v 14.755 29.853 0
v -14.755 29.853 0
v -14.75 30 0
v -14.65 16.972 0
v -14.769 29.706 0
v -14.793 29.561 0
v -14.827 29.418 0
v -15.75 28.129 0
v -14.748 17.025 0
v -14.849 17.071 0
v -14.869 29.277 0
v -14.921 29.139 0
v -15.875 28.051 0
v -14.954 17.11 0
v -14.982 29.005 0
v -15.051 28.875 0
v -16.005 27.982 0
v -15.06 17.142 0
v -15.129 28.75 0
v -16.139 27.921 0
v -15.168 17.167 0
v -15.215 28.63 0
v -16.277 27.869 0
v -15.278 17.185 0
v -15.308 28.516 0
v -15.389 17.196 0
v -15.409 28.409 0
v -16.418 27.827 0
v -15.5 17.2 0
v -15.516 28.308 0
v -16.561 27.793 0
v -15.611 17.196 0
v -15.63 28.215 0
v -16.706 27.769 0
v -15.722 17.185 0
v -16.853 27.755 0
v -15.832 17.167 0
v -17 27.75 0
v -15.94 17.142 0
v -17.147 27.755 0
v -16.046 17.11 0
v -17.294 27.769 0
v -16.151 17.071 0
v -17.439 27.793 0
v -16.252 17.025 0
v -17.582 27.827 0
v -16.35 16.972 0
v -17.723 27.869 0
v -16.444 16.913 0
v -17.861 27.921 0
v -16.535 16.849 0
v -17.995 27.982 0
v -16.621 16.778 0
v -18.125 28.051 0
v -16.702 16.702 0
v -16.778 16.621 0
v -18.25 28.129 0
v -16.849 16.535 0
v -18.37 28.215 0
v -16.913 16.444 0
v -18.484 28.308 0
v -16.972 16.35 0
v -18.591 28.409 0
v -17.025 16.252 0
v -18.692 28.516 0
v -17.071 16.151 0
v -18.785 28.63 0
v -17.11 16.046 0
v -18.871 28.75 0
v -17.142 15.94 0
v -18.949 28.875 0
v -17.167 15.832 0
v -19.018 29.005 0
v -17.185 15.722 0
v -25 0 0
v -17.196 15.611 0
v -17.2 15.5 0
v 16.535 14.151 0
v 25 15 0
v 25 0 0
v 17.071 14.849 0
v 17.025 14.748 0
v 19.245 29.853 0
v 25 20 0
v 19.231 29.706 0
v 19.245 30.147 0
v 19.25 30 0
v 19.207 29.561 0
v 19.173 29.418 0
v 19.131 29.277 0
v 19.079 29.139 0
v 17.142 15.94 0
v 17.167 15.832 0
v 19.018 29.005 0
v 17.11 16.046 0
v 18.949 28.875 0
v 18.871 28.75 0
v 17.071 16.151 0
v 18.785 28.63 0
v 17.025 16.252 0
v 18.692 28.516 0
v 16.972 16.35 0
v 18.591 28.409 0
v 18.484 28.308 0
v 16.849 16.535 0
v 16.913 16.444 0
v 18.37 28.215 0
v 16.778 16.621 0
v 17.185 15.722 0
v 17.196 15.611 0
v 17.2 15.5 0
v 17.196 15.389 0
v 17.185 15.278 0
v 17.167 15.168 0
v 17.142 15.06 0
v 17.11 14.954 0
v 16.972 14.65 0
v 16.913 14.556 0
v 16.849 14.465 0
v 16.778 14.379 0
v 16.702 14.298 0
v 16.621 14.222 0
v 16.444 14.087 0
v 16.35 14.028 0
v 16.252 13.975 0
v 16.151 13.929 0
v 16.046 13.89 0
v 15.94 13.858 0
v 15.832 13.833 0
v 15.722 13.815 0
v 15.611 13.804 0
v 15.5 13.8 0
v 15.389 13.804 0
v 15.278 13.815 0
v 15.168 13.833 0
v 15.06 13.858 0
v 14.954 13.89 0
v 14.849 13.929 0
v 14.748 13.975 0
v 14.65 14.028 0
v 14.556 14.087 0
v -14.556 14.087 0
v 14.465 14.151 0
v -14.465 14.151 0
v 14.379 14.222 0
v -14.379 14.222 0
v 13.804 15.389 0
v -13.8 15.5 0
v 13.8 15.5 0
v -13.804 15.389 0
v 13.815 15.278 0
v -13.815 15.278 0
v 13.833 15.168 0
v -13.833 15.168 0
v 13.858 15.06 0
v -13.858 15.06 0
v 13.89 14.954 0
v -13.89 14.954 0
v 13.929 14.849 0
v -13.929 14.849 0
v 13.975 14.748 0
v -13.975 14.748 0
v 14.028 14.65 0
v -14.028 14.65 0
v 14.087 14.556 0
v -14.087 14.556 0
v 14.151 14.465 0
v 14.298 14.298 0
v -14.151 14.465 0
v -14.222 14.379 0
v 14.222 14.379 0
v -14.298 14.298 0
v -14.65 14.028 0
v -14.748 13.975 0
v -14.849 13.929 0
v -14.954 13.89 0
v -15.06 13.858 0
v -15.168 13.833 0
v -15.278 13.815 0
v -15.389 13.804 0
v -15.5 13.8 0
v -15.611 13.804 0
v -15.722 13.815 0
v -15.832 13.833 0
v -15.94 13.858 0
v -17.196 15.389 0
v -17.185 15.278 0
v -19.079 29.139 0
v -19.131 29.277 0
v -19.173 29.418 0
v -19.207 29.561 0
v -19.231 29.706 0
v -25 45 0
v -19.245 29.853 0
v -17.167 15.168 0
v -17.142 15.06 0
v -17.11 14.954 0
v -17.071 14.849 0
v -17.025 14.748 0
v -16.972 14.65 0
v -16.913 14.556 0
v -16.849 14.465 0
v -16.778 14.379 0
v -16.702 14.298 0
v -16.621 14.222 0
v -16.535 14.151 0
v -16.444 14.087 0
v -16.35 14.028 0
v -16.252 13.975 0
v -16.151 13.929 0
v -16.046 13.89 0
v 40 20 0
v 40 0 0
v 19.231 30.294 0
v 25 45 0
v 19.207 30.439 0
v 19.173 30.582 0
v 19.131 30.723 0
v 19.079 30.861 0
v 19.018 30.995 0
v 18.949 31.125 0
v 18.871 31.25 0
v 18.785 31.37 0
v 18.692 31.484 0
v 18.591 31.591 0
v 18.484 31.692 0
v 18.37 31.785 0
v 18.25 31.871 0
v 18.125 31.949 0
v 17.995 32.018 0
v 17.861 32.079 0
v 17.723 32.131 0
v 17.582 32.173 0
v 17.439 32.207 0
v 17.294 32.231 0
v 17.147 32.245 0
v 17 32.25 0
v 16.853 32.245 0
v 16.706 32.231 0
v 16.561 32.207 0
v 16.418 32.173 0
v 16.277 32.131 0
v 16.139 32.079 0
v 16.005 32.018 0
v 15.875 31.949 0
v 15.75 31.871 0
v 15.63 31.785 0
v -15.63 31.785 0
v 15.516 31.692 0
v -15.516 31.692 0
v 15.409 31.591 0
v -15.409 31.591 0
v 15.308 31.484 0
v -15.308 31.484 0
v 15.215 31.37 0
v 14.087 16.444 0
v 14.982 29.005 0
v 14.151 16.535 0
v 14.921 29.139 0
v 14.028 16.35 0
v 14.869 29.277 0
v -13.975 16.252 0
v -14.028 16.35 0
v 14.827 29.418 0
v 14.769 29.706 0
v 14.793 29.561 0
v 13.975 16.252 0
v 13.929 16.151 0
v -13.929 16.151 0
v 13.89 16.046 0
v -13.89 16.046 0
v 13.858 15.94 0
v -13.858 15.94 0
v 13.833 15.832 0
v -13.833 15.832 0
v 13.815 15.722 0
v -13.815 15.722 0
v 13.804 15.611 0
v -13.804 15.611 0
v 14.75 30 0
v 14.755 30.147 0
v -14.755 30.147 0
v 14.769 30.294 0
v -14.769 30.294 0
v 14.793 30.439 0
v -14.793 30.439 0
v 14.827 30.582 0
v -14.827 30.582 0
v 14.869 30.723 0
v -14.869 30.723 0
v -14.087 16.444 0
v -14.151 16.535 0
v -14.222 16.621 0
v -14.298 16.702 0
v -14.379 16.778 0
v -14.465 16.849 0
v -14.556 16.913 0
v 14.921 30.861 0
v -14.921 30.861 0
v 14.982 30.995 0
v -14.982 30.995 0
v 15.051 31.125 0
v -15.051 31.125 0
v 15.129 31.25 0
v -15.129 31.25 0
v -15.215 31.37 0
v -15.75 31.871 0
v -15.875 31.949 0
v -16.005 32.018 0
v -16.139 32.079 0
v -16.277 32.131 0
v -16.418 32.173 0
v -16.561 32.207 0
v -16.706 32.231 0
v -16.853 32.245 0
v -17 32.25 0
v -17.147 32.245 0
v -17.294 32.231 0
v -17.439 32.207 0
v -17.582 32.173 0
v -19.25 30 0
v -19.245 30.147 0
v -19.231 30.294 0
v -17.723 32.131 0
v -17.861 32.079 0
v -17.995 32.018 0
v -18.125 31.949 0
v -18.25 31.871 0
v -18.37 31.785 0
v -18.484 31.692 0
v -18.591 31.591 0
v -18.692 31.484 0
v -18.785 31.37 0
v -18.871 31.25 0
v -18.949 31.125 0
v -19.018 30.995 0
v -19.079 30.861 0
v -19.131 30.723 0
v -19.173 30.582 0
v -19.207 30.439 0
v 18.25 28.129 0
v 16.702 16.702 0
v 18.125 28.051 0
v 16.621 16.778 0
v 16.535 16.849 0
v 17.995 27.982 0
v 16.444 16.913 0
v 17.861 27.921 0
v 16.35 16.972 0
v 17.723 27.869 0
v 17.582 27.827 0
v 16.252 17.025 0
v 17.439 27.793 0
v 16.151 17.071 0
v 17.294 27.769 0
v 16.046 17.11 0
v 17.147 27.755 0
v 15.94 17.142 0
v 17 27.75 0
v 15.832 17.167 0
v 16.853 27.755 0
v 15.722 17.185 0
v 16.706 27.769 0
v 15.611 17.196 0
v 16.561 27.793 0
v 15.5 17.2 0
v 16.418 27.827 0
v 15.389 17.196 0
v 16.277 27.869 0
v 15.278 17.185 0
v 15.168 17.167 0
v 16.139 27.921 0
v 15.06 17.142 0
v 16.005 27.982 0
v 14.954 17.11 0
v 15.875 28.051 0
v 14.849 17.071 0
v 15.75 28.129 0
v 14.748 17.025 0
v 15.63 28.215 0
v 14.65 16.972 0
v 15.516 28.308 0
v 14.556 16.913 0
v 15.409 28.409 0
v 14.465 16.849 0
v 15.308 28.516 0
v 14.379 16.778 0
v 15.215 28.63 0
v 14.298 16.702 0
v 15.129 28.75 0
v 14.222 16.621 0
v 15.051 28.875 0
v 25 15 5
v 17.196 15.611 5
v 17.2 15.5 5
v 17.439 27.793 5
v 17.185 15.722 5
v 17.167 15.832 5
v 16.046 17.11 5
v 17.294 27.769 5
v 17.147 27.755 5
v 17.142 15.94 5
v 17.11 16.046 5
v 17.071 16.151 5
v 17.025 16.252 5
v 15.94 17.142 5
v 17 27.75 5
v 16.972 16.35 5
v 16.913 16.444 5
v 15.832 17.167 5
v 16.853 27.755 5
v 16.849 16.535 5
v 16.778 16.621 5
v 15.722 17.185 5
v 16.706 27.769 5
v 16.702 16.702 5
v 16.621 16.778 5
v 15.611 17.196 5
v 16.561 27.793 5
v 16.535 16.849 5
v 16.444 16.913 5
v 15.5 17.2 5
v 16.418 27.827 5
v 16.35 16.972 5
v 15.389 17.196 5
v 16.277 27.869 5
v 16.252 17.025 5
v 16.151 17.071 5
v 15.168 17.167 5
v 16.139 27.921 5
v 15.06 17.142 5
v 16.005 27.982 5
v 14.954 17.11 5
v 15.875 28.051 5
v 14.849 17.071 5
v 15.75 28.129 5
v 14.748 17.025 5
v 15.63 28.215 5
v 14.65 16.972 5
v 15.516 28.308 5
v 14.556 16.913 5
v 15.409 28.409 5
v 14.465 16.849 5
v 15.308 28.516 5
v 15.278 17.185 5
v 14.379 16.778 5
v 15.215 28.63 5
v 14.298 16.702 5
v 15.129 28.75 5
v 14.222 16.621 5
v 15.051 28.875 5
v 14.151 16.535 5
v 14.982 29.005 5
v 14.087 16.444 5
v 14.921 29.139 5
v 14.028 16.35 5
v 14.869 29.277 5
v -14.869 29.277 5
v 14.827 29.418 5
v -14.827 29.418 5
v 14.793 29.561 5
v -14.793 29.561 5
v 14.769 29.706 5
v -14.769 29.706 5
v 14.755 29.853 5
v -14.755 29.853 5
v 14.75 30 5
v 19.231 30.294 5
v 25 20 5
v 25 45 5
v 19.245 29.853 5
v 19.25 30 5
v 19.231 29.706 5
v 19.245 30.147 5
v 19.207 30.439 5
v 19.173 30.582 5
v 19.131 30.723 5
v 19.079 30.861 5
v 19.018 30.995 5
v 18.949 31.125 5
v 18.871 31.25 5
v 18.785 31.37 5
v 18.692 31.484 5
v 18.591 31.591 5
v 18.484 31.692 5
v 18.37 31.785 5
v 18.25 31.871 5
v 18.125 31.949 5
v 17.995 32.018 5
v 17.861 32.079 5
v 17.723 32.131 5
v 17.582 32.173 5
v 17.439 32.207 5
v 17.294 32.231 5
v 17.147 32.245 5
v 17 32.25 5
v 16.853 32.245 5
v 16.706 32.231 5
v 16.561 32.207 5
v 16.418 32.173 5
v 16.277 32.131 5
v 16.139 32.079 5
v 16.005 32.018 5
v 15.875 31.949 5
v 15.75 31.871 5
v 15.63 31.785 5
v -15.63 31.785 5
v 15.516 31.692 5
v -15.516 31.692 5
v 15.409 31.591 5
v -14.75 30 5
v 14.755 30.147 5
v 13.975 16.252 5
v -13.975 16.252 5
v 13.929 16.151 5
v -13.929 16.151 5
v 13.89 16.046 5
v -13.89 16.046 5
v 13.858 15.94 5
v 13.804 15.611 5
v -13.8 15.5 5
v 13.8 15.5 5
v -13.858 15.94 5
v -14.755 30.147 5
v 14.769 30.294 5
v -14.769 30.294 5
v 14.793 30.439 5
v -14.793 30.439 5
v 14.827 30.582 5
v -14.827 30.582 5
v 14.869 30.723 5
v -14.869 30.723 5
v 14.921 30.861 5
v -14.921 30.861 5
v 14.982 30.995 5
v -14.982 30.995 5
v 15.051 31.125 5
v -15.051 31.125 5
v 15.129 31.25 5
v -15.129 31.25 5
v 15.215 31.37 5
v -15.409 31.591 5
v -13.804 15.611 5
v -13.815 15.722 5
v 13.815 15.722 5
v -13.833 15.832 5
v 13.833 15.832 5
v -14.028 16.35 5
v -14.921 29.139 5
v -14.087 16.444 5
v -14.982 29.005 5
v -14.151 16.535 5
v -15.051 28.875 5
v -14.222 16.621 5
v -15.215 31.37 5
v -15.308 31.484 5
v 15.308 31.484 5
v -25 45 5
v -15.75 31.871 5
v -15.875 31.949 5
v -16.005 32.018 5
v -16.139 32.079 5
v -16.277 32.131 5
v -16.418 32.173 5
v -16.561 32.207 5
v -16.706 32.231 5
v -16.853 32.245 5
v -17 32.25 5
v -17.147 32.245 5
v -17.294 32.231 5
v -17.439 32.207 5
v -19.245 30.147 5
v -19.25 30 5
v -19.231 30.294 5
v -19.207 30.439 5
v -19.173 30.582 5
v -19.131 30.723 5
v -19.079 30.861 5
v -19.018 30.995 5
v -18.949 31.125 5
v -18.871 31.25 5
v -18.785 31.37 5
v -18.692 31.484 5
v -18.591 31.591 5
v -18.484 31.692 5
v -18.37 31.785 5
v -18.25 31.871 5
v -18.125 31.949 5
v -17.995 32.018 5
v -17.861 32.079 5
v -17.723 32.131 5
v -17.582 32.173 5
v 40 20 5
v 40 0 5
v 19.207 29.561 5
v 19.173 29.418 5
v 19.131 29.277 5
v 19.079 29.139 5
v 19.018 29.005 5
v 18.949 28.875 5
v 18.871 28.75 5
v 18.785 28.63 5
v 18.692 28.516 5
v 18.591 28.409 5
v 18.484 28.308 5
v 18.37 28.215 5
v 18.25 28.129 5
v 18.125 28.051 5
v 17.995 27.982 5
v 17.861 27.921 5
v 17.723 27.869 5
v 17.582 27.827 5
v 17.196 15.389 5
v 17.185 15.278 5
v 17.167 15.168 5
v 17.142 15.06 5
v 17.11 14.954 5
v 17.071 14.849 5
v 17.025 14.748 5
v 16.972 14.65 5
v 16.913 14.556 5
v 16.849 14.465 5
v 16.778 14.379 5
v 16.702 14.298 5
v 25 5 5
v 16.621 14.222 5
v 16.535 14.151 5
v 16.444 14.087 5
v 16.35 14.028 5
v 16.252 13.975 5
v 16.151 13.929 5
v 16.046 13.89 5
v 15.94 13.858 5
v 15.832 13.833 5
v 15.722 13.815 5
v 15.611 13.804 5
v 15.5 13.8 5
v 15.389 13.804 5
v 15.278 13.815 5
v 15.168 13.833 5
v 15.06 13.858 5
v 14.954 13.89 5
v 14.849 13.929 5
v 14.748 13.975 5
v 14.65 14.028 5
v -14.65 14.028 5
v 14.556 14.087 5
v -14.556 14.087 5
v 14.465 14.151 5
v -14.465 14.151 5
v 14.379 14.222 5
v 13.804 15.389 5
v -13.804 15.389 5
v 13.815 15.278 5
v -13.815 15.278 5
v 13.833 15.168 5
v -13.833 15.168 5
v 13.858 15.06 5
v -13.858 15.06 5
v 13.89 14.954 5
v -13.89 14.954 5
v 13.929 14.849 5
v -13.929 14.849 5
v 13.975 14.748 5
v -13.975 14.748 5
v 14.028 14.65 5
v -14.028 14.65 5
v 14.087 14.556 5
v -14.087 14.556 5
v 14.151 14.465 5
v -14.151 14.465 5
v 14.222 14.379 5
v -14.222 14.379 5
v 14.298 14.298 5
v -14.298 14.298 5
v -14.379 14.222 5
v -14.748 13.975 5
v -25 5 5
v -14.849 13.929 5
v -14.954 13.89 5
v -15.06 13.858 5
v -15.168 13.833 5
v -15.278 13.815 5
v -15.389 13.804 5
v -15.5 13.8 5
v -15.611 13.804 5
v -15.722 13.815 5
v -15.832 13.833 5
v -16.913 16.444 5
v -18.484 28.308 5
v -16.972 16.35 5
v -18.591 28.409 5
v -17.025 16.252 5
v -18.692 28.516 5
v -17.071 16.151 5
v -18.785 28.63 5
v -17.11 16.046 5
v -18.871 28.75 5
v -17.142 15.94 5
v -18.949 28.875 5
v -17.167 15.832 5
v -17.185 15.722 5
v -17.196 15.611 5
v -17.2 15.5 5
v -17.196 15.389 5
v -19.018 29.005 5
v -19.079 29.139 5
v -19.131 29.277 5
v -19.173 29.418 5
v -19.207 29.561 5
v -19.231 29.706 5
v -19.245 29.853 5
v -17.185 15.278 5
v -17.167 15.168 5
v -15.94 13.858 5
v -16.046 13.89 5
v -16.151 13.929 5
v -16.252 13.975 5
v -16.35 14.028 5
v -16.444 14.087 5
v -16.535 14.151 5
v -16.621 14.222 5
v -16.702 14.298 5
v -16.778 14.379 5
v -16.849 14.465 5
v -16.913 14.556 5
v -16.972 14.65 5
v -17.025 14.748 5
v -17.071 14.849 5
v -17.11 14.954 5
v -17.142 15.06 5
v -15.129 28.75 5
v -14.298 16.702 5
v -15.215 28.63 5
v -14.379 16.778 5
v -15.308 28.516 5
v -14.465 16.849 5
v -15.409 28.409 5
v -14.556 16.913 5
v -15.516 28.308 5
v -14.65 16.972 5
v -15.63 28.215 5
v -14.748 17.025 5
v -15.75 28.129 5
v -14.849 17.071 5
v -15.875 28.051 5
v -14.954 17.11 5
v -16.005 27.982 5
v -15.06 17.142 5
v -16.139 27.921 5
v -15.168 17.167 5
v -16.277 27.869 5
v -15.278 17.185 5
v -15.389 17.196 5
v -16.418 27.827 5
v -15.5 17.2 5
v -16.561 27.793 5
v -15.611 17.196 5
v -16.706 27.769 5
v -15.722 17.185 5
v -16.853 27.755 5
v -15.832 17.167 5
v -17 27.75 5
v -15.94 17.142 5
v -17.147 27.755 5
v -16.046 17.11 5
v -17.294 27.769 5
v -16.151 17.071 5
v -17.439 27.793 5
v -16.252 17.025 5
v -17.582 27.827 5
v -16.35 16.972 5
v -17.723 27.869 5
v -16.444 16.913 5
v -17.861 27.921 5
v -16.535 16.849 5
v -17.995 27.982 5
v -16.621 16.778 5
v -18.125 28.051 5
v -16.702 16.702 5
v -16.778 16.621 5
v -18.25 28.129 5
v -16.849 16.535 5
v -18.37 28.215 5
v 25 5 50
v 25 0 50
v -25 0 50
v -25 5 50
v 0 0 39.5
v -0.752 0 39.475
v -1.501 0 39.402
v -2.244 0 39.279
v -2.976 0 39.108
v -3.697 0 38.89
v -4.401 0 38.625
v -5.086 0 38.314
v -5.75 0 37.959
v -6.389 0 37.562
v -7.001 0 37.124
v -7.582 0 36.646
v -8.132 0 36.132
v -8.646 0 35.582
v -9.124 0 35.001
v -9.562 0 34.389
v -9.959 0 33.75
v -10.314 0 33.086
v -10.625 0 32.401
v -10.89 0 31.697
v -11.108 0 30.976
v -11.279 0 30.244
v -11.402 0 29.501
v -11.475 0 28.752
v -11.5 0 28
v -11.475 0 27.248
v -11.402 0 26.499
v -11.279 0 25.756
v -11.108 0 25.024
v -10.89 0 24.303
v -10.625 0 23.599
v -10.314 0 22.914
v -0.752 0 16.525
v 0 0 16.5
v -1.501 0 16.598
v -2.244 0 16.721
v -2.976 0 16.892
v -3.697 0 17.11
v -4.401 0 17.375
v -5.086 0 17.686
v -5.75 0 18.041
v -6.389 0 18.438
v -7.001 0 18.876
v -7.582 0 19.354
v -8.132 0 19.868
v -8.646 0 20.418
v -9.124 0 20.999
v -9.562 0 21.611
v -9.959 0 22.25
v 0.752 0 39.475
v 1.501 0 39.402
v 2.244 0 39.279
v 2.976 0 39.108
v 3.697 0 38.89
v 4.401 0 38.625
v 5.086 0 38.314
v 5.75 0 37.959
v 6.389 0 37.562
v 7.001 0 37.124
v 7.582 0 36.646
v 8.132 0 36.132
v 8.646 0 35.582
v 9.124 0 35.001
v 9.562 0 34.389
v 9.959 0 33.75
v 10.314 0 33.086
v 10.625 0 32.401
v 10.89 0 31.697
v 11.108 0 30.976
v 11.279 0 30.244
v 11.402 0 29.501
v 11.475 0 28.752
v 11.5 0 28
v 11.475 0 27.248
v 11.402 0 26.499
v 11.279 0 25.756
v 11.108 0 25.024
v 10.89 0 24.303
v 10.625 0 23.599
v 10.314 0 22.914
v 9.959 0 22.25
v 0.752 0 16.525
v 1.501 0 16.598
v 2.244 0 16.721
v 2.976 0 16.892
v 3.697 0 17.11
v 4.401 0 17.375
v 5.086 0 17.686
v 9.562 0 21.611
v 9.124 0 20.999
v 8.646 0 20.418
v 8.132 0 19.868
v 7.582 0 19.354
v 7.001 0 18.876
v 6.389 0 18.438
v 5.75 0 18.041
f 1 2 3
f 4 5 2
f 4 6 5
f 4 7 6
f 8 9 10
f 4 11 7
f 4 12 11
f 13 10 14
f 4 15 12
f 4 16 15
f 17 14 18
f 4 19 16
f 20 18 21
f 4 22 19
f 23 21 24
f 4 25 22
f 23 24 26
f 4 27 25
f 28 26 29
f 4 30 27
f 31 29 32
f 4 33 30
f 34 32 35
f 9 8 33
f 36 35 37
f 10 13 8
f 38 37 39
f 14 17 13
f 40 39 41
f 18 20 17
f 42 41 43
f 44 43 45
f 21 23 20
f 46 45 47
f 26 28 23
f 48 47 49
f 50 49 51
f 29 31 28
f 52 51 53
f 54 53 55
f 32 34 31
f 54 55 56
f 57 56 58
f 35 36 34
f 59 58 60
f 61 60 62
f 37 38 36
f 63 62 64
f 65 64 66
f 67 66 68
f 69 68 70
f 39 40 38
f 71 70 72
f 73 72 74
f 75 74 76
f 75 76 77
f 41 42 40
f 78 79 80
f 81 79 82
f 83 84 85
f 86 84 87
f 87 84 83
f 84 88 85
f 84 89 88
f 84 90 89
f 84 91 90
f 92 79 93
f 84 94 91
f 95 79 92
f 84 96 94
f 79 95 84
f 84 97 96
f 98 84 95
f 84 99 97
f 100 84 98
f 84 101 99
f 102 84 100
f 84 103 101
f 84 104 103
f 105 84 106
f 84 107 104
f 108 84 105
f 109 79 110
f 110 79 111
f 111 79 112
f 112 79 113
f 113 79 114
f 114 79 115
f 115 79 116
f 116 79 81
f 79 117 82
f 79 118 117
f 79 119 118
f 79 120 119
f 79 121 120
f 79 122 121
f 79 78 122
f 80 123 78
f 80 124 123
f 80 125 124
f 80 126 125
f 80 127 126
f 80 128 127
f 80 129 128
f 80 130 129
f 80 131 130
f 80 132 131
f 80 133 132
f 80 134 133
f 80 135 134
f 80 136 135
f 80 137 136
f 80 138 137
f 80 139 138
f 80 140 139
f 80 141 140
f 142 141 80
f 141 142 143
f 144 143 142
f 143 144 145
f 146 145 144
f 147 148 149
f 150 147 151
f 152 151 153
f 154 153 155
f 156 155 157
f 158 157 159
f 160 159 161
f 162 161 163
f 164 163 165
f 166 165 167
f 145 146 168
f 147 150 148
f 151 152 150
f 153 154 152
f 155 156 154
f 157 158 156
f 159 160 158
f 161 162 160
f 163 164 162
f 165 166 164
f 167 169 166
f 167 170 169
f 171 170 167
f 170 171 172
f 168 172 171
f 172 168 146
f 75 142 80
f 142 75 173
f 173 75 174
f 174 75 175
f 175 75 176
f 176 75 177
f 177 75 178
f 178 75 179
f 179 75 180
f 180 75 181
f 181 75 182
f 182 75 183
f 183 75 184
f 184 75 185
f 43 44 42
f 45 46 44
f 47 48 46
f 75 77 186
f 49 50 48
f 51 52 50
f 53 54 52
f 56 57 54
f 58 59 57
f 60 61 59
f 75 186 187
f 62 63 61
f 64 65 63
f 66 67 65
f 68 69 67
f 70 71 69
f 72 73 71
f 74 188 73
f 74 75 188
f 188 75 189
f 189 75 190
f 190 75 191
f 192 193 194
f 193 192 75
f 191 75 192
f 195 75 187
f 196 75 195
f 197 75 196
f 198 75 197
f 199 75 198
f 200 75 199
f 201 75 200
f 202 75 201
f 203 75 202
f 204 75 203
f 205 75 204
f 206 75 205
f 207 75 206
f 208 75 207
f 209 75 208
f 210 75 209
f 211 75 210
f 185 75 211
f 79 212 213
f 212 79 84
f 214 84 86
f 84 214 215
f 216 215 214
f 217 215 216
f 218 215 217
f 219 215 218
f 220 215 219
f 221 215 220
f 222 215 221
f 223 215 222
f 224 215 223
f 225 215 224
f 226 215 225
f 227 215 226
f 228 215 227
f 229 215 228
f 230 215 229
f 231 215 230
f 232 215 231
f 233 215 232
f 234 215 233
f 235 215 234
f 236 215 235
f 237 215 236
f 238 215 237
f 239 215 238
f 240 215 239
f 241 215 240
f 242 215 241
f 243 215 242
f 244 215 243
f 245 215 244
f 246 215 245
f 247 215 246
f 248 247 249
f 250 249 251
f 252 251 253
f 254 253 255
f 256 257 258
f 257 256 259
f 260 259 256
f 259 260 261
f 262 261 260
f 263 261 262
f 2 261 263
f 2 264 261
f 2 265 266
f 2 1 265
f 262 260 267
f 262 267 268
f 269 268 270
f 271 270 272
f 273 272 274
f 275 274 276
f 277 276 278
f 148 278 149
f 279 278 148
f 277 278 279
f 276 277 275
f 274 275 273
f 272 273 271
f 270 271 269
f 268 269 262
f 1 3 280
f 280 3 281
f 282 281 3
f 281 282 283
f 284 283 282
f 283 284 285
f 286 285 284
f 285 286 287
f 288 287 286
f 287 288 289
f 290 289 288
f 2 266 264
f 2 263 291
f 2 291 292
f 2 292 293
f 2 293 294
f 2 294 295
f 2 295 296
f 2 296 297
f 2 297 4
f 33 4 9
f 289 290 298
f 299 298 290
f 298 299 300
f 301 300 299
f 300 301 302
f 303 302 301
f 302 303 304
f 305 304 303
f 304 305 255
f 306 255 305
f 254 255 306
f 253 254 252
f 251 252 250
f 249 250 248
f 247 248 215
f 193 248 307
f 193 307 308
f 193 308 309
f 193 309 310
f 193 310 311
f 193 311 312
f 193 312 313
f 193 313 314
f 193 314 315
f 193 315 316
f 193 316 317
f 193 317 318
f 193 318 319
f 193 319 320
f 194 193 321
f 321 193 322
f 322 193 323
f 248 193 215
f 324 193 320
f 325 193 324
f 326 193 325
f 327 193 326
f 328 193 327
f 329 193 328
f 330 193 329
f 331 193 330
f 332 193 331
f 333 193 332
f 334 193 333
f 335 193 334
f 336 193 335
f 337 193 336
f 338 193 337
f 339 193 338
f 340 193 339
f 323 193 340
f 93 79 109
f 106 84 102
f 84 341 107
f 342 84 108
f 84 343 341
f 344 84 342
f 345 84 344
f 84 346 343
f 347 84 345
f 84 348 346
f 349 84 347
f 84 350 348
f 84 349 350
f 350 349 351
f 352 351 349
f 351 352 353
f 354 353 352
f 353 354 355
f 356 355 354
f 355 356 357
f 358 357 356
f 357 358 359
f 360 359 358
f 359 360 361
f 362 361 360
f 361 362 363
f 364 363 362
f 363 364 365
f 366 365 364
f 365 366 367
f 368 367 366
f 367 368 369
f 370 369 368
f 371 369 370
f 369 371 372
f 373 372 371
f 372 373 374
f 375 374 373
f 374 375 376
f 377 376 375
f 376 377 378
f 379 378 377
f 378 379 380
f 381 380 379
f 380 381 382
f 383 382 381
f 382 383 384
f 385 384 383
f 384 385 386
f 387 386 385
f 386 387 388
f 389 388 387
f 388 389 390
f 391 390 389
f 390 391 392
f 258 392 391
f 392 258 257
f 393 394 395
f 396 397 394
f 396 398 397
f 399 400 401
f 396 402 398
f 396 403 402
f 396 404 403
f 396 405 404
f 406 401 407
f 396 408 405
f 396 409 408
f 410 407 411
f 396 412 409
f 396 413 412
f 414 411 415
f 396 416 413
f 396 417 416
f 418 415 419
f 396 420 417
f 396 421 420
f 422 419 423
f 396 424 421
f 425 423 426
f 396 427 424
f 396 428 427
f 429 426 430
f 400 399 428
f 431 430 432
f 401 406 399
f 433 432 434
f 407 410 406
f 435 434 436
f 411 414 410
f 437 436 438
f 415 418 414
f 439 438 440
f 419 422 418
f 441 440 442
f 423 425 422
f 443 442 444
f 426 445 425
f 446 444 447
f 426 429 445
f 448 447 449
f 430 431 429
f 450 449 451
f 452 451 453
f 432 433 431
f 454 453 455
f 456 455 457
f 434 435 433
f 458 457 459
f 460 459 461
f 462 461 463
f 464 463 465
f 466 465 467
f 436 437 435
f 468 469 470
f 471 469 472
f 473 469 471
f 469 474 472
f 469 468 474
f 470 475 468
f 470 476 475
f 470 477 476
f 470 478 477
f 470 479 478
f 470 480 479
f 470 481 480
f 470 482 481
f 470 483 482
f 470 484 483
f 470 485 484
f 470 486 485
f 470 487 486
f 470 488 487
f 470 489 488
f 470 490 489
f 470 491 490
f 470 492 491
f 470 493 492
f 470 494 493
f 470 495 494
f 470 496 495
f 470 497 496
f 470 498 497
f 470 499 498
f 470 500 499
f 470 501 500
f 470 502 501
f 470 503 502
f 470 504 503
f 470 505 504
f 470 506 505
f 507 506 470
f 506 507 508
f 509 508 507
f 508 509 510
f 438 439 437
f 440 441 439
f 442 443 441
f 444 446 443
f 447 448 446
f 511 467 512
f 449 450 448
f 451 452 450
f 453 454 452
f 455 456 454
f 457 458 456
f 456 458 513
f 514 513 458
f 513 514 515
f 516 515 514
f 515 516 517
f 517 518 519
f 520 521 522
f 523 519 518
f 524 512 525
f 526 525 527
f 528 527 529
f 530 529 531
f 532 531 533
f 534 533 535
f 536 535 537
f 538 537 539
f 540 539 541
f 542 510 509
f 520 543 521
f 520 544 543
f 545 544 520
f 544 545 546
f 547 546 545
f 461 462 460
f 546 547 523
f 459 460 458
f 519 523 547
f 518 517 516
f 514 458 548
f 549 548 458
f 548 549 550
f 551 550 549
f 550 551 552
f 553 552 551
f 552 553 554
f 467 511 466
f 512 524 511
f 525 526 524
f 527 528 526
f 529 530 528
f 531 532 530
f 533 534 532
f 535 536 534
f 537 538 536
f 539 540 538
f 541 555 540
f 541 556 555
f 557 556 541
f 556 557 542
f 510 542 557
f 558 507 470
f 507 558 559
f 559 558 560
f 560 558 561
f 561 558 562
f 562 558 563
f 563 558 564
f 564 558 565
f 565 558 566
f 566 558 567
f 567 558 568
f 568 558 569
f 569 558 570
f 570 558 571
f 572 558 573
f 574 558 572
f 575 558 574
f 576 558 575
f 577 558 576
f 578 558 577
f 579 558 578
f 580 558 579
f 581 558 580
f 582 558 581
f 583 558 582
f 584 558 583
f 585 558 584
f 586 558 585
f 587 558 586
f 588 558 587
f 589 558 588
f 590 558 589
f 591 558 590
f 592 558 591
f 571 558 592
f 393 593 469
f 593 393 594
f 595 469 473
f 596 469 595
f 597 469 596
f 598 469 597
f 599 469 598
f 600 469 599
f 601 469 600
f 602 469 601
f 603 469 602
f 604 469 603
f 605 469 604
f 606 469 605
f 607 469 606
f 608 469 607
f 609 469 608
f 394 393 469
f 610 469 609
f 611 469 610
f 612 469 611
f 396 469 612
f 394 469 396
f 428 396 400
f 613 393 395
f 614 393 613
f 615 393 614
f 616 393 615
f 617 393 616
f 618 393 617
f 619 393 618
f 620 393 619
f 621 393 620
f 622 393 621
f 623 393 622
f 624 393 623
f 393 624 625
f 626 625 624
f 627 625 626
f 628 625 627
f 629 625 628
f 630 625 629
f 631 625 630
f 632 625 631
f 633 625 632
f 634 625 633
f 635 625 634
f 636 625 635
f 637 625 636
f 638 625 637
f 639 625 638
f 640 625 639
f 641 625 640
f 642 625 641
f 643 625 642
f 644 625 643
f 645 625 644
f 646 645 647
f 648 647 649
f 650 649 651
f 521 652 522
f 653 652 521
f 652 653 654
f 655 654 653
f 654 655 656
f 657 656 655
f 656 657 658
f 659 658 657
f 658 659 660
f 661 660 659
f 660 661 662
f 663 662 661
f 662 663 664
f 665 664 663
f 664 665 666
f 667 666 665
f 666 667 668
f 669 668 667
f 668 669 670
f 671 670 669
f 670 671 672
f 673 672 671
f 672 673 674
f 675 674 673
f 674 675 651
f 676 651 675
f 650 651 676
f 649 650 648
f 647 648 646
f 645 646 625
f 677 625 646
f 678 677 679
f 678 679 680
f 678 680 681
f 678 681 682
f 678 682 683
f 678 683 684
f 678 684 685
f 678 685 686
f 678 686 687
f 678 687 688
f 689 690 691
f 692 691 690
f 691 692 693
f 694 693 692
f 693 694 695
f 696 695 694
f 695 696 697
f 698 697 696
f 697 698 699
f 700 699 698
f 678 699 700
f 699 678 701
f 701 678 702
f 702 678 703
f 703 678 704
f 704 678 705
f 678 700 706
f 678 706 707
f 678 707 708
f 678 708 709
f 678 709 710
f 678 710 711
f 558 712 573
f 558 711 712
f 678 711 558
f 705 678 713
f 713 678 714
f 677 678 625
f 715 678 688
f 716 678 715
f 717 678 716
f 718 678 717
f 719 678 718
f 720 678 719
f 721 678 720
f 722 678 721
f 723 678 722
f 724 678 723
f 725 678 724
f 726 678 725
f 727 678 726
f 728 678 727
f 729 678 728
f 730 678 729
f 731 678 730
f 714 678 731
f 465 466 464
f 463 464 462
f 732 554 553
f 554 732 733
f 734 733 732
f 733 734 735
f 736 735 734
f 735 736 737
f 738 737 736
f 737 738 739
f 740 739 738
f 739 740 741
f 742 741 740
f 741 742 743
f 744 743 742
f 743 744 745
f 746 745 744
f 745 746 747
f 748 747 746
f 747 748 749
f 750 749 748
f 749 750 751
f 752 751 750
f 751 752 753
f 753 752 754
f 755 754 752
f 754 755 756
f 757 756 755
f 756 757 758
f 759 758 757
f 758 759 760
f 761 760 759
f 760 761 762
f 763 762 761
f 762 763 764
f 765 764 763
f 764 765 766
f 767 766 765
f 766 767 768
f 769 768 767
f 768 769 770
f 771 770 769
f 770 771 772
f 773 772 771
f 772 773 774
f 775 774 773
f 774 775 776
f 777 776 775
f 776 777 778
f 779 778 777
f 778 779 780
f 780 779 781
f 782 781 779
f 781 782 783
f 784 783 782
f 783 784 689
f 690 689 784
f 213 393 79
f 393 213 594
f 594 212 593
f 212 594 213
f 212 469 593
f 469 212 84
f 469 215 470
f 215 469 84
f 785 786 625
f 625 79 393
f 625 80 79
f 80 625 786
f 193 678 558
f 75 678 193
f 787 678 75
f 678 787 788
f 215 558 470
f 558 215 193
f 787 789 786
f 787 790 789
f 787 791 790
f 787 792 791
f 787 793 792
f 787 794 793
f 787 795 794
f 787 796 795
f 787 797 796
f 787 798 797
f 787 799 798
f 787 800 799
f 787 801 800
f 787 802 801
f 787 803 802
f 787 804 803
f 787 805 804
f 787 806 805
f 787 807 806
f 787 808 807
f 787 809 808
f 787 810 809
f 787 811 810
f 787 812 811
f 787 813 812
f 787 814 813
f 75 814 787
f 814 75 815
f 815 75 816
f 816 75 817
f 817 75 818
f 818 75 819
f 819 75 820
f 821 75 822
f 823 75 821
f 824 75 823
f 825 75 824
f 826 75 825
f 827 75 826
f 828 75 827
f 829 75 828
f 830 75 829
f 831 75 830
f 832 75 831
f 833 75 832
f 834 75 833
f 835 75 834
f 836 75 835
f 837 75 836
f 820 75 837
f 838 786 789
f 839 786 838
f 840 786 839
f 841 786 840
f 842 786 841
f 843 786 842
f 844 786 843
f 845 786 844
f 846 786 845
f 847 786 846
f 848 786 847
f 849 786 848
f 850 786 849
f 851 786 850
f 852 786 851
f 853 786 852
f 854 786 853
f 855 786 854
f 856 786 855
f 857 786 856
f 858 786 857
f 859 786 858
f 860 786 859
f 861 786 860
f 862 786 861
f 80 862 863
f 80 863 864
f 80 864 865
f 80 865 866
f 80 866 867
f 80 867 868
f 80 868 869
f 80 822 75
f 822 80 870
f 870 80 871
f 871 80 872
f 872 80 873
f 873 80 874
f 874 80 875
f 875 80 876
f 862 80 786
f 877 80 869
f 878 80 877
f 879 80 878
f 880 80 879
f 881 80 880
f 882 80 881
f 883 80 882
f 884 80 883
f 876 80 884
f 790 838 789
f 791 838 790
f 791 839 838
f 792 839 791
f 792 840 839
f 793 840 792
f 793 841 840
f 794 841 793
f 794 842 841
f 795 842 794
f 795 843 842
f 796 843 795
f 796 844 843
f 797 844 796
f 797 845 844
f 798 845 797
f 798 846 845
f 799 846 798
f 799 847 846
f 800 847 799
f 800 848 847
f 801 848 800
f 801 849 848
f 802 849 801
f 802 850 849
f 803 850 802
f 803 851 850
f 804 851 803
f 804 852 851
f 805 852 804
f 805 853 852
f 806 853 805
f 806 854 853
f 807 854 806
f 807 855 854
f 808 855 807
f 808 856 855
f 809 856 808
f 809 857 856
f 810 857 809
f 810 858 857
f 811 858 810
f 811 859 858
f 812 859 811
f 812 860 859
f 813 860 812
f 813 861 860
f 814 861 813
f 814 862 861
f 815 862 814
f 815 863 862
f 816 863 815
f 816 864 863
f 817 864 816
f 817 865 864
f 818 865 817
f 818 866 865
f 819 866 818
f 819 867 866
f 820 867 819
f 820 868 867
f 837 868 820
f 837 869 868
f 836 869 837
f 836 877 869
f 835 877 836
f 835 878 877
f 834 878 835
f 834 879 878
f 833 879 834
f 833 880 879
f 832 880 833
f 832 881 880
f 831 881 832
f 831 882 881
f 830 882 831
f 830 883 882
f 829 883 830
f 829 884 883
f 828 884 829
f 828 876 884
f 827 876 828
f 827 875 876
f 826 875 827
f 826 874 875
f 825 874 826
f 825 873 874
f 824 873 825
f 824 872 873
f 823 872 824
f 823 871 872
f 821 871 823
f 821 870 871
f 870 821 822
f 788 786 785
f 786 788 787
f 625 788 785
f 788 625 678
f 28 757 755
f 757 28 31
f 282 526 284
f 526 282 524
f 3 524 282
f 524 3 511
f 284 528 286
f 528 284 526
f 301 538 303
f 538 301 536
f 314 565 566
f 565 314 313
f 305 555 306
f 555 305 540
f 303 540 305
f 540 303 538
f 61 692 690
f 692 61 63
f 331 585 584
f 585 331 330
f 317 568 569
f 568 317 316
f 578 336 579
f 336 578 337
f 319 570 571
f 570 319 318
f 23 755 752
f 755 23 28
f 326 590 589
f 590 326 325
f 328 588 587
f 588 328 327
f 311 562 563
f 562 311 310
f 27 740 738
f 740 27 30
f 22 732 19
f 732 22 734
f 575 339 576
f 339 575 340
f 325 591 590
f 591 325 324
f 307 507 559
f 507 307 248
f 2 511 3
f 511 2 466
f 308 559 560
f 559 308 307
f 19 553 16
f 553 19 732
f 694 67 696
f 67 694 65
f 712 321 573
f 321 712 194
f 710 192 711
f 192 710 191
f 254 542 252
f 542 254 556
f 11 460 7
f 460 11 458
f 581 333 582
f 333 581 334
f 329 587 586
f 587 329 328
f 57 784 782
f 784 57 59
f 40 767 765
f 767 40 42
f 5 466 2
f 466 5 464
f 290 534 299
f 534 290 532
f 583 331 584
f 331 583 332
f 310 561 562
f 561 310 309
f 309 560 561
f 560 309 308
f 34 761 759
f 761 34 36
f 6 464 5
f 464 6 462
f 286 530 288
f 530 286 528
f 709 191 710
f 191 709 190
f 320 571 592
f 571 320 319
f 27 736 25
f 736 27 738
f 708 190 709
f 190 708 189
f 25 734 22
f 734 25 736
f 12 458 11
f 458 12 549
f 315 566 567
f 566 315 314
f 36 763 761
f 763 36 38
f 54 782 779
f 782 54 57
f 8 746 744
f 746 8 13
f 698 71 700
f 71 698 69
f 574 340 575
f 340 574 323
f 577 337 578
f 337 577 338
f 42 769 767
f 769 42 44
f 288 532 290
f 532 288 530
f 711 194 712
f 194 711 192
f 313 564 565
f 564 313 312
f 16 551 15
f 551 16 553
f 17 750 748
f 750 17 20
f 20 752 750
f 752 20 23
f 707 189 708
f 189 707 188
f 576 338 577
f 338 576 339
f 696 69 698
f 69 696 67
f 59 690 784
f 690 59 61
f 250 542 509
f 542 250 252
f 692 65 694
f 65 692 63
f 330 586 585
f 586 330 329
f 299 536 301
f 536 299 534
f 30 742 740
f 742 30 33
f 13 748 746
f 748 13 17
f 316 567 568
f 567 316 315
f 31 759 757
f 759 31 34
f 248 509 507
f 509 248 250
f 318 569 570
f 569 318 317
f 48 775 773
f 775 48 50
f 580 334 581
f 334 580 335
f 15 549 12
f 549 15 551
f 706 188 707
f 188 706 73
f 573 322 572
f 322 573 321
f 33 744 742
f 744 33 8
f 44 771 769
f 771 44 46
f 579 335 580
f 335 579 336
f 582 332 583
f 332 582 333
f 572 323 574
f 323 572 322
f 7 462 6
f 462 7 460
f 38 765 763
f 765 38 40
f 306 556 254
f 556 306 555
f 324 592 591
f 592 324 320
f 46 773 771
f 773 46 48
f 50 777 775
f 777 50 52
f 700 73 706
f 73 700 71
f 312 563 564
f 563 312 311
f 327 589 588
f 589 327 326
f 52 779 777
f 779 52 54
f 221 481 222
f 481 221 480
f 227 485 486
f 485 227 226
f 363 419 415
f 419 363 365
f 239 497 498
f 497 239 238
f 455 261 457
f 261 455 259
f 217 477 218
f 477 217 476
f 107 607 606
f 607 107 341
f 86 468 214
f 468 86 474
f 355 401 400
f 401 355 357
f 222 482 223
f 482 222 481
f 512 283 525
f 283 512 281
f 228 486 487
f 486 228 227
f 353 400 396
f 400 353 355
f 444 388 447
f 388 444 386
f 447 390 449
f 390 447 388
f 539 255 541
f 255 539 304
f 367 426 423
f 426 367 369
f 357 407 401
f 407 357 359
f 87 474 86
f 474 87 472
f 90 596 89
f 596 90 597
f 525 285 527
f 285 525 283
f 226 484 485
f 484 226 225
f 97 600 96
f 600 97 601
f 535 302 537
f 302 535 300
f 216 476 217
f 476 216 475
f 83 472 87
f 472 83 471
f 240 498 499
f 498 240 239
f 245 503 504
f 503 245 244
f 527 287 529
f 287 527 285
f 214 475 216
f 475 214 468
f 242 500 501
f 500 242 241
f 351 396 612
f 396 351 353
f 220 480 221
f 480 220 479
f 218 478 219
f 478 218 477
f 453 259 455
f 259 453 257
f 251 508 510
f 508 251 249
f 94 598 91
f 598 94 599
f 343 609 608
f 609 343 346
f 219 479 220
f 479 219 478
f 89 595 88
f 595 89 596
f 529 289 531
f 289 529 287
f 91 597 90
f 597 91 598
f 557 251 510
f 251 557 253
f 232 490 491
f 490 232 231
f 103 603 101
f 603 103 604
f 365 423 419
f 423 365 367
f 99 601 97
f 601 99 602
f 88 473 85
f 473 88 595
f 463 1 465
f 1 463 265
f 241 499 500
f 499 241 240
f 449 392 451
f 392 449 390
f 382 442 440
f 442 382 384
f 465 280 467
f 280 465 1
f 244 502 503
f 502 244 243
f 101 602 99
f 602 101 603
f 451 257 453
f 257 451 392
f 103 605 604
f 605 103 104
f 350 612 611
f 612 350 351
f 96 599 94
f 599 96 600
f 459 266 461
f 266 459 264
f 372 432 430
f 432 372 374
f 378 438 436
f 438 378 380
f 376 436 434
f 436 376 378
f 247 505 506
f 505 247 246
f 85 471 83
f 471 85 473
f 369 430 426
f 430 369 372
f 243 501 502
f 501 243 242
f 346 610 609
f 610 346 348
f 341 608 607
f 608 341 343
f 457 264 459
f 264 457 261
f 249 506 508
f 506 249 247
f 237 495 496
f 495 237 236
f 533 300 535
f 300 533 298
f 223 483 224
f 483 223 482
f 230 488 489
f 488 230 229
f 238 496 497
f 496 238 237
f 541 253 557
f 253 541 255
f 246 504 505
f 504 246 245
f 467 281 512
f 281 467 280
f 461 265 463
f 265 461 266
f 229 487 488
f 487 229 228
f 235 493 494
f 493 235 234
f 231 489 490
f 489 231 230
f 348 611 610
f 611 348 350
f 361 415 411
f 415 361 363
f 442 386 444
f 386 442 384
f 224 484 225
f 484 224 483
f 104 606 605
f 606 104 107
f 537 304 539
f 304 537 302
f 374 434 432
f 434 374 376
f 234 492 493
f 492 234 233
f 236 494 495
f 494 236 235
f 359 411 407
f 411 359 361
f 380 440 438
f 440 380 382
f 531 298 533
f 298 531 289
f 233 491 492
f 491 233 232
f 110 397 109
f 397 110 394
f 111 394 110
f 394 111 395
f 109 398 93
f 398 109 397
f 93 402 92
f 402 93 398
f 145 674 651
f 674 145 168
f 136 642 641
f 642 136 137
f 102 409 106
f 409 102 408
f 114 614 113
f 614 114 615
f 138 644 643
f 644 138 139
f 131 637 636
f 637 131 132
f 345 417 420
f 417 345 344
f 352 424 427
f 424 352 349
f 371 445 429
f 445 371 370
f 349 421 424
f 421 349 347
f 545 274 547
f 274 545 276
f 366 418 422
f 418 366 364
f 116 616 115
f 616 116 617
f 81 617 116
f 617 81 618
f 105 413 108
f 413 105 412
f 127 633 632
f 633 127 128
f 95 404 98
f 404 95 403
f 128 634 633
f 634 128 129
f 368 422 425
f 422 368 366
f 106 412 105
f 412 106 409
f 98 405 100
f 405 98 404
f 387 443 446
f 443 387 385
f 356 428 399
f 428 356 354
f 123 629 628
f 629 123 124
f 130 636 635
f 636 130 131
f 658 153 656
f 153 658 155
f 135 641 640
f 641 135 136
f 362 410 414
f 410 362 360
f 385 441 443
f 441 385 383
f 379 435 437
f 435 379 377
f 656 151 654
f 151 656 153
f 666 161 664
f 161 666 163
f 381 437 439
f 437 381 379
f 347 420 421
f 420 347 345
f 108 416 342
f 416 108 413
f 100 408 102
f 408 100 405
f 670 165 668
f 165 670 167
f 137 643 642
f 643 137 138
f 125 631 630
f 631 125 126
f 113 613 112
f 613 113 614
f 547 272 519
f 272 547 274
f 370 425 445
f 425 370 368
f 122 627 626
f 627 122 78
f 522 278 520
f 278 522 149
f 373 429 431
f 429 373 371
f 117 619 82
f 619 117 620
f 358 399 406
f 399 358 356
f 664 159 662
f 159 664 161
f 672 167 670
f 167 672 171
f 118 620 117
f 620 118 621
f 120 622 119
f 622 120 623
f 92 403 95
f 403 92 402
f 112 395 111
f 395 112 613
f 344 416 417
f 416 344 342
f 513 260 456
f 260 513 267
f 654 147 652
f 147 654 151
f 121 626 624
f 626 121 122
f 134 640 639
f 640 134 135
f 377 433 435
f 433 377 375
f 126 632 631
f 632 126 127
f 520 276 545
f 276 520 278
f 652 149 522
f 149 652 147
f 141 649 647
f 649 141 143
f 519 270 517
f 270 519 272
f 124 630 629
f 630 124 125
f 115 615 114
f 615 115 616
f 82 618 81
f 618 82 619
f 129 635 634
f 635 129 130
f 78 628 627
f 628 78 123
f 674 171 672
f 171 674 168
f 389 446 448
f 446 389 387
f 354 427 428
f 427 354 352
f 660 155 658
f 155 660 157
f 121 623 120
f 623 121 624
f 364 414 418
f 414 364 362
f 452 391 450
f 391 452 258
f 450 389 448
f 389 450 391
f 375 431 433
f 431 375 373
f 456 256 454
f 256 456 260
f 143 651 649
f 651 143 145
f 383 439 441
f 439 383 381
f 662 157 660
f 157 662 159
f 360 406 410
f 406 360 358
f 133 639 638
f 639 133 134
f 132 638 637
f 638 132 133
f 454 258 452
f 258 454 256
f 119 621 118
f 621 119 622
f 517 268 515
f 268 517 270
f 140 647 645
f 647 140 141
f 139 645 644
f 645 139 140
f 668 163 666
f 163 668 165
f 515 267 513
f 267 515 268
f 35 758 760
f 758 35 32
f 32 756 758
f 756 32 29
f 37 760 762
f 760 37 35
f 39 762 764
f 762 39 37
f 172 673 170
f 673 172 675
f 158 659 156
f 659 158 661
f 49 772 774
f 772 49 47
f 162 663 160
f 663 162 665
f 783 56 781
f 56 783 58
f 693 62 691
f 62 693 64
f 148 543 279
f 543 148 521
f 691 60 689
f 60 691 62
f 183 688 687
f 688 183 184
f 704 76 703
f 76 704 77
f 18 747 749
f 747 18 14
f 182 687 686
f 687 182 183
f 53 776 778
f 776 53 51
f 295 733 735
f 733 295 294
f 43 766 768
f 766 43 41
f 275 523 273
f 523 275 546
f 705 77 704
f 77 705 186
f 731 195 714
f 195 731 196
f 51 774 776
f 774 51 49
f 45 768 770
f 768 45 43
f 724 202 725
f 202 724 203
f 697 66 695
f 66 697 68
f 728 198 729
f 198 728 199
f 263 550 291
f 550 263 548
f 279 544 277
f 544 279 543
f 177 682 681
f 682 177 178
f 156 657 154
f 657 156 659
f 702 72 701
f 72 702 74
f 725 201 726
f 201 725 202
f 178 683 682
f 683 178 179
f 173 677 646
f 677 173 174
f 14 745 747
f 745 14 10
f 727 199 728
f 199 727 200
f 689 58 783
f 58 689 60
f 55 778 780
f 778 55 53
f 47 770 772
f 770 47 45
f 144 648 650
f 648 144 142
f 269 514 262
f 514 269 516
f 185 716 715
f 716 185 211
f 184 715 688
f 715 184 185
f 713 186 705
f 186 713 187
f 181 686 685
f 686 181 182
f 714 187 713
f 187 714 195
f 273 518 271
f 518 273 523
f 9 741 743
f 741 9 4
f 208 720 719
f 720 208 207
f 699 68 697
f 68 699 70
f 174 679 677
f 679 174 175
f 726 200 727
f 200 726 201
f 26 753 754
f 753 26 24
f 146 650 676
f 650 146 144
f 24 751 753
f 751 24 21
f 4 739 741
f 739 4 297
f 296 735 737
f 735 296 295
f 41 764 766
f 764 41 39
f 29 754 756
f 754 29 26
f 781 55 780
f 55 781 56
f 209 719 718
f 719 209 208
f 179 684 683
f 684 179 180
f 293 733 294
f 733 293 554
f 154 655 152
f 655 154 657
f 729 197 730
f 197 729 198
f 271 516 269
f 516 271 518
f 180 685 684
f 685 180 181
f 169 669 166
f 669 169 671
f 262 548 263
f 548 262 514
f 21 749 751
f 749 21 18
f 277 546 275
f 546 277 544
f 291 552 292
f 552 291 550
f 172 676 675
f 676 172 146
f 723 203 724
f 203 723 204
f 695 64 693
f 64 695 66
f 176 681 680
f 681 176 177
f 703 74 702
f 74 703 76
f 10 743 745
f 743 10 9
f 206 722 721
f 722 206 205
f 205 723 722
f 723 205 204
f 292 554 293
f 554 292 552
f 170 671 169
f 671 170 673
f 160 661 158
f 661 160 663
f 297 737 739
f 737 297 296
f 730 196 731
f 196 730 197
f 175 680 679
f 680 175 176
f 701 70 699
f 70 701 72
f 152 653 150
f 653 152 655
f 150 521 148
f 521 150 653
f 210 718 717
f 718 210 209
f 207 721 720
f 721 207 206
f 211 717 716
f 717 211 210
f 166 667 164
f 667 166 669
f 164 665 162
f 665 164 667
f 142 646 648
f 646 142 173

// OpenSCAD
// L-shaped mounting bracket for NEMA 17 stepper motor
// Print orientation: base plate on bed, vertical plate builds upward (+Z)

// ---------------- Parameters ----------------
plate_w      = 50;    // base plate length (X)
plate_h      = 45;    // base plate width (Y)
plate_t      = 5;     // base plate thickness (Z)

hole_x       = 17;    // M4 through-hole X offset (±)
hole_y       = 30;    // M4 through-hole Y position
hole_d       = 4.5;   // M4 through-hole diameter

plate_v_w    = 50;    // vertical motor plate length (X)
plate_v_h    = 5;     // vertical motor plate width (Y)
plate_v_z    = 50;    // vertical motor plate height (Z)

boss_d       = 23;    // motor centring boss hole diameter
boss_x       = 0;     // boss hole X centre
boss_z       = 28;    // boss hole Z centre

screw_d      = 3.4;   // M3 screw hole diameter
screw_pitch  = 31;    // square pattern side length

gusset_t     = 5;     // gusset thickness (X)
gusset_leg   = 20;    // right-triangle leg length (Y and Z)
gusset_x     = 25;    // gusset attachment X position

eps          = 0.5;   // cutter overshoot past faces

$fn = 96;

// ---------------- Model ----------------
difference() {
    union() {
        // Base plate
        translate([-plate_w/2, 0, 0])
            cube([plate_w, plate_h, plate_t]);

        // Vertical motor plate
        translate([-plate_v_w/2, 0, 0])
            cube([plate_v_w, plate_v_h, plate_v_z]);

        // Gussets (right and left)
        for (sx = [-1, 1])
            translate([sx > 0 ? gusset_x - gusset_t : -gusset_t, 0, 0])
                linear_extrude(height = gusset_t)
                    polygon(points = [
                        [0, gusset_leg],
                        [gusset_leg, gusset_leg],
                        [gusset_leg, 0]
                    ]);
    }

    // M4 through-holes in base plate
    for (x = [-hole_x, hole_x])
        translate([x, hole_y, -eps])
            cylinder(d = hole_d, h = plate_t + 2*eps);

    // Motor boss hole through vertical plate (along Y)
    translate([boss_x, 0, boss_z])
        rotate([90, 0, 0])
            cylinder(d = boss_d, h = plate_v_h + 2*eps);

    // M3 screw holes on square pattern around boss hole
    for (a = [0, 90, 180, 270])
        rotate([0, 0, a])
            translate([screw_pitch/2, screw_pitch/2, 0])
                cylinder(d = screw_d, h = plate_v_z + 2*eps);
}
